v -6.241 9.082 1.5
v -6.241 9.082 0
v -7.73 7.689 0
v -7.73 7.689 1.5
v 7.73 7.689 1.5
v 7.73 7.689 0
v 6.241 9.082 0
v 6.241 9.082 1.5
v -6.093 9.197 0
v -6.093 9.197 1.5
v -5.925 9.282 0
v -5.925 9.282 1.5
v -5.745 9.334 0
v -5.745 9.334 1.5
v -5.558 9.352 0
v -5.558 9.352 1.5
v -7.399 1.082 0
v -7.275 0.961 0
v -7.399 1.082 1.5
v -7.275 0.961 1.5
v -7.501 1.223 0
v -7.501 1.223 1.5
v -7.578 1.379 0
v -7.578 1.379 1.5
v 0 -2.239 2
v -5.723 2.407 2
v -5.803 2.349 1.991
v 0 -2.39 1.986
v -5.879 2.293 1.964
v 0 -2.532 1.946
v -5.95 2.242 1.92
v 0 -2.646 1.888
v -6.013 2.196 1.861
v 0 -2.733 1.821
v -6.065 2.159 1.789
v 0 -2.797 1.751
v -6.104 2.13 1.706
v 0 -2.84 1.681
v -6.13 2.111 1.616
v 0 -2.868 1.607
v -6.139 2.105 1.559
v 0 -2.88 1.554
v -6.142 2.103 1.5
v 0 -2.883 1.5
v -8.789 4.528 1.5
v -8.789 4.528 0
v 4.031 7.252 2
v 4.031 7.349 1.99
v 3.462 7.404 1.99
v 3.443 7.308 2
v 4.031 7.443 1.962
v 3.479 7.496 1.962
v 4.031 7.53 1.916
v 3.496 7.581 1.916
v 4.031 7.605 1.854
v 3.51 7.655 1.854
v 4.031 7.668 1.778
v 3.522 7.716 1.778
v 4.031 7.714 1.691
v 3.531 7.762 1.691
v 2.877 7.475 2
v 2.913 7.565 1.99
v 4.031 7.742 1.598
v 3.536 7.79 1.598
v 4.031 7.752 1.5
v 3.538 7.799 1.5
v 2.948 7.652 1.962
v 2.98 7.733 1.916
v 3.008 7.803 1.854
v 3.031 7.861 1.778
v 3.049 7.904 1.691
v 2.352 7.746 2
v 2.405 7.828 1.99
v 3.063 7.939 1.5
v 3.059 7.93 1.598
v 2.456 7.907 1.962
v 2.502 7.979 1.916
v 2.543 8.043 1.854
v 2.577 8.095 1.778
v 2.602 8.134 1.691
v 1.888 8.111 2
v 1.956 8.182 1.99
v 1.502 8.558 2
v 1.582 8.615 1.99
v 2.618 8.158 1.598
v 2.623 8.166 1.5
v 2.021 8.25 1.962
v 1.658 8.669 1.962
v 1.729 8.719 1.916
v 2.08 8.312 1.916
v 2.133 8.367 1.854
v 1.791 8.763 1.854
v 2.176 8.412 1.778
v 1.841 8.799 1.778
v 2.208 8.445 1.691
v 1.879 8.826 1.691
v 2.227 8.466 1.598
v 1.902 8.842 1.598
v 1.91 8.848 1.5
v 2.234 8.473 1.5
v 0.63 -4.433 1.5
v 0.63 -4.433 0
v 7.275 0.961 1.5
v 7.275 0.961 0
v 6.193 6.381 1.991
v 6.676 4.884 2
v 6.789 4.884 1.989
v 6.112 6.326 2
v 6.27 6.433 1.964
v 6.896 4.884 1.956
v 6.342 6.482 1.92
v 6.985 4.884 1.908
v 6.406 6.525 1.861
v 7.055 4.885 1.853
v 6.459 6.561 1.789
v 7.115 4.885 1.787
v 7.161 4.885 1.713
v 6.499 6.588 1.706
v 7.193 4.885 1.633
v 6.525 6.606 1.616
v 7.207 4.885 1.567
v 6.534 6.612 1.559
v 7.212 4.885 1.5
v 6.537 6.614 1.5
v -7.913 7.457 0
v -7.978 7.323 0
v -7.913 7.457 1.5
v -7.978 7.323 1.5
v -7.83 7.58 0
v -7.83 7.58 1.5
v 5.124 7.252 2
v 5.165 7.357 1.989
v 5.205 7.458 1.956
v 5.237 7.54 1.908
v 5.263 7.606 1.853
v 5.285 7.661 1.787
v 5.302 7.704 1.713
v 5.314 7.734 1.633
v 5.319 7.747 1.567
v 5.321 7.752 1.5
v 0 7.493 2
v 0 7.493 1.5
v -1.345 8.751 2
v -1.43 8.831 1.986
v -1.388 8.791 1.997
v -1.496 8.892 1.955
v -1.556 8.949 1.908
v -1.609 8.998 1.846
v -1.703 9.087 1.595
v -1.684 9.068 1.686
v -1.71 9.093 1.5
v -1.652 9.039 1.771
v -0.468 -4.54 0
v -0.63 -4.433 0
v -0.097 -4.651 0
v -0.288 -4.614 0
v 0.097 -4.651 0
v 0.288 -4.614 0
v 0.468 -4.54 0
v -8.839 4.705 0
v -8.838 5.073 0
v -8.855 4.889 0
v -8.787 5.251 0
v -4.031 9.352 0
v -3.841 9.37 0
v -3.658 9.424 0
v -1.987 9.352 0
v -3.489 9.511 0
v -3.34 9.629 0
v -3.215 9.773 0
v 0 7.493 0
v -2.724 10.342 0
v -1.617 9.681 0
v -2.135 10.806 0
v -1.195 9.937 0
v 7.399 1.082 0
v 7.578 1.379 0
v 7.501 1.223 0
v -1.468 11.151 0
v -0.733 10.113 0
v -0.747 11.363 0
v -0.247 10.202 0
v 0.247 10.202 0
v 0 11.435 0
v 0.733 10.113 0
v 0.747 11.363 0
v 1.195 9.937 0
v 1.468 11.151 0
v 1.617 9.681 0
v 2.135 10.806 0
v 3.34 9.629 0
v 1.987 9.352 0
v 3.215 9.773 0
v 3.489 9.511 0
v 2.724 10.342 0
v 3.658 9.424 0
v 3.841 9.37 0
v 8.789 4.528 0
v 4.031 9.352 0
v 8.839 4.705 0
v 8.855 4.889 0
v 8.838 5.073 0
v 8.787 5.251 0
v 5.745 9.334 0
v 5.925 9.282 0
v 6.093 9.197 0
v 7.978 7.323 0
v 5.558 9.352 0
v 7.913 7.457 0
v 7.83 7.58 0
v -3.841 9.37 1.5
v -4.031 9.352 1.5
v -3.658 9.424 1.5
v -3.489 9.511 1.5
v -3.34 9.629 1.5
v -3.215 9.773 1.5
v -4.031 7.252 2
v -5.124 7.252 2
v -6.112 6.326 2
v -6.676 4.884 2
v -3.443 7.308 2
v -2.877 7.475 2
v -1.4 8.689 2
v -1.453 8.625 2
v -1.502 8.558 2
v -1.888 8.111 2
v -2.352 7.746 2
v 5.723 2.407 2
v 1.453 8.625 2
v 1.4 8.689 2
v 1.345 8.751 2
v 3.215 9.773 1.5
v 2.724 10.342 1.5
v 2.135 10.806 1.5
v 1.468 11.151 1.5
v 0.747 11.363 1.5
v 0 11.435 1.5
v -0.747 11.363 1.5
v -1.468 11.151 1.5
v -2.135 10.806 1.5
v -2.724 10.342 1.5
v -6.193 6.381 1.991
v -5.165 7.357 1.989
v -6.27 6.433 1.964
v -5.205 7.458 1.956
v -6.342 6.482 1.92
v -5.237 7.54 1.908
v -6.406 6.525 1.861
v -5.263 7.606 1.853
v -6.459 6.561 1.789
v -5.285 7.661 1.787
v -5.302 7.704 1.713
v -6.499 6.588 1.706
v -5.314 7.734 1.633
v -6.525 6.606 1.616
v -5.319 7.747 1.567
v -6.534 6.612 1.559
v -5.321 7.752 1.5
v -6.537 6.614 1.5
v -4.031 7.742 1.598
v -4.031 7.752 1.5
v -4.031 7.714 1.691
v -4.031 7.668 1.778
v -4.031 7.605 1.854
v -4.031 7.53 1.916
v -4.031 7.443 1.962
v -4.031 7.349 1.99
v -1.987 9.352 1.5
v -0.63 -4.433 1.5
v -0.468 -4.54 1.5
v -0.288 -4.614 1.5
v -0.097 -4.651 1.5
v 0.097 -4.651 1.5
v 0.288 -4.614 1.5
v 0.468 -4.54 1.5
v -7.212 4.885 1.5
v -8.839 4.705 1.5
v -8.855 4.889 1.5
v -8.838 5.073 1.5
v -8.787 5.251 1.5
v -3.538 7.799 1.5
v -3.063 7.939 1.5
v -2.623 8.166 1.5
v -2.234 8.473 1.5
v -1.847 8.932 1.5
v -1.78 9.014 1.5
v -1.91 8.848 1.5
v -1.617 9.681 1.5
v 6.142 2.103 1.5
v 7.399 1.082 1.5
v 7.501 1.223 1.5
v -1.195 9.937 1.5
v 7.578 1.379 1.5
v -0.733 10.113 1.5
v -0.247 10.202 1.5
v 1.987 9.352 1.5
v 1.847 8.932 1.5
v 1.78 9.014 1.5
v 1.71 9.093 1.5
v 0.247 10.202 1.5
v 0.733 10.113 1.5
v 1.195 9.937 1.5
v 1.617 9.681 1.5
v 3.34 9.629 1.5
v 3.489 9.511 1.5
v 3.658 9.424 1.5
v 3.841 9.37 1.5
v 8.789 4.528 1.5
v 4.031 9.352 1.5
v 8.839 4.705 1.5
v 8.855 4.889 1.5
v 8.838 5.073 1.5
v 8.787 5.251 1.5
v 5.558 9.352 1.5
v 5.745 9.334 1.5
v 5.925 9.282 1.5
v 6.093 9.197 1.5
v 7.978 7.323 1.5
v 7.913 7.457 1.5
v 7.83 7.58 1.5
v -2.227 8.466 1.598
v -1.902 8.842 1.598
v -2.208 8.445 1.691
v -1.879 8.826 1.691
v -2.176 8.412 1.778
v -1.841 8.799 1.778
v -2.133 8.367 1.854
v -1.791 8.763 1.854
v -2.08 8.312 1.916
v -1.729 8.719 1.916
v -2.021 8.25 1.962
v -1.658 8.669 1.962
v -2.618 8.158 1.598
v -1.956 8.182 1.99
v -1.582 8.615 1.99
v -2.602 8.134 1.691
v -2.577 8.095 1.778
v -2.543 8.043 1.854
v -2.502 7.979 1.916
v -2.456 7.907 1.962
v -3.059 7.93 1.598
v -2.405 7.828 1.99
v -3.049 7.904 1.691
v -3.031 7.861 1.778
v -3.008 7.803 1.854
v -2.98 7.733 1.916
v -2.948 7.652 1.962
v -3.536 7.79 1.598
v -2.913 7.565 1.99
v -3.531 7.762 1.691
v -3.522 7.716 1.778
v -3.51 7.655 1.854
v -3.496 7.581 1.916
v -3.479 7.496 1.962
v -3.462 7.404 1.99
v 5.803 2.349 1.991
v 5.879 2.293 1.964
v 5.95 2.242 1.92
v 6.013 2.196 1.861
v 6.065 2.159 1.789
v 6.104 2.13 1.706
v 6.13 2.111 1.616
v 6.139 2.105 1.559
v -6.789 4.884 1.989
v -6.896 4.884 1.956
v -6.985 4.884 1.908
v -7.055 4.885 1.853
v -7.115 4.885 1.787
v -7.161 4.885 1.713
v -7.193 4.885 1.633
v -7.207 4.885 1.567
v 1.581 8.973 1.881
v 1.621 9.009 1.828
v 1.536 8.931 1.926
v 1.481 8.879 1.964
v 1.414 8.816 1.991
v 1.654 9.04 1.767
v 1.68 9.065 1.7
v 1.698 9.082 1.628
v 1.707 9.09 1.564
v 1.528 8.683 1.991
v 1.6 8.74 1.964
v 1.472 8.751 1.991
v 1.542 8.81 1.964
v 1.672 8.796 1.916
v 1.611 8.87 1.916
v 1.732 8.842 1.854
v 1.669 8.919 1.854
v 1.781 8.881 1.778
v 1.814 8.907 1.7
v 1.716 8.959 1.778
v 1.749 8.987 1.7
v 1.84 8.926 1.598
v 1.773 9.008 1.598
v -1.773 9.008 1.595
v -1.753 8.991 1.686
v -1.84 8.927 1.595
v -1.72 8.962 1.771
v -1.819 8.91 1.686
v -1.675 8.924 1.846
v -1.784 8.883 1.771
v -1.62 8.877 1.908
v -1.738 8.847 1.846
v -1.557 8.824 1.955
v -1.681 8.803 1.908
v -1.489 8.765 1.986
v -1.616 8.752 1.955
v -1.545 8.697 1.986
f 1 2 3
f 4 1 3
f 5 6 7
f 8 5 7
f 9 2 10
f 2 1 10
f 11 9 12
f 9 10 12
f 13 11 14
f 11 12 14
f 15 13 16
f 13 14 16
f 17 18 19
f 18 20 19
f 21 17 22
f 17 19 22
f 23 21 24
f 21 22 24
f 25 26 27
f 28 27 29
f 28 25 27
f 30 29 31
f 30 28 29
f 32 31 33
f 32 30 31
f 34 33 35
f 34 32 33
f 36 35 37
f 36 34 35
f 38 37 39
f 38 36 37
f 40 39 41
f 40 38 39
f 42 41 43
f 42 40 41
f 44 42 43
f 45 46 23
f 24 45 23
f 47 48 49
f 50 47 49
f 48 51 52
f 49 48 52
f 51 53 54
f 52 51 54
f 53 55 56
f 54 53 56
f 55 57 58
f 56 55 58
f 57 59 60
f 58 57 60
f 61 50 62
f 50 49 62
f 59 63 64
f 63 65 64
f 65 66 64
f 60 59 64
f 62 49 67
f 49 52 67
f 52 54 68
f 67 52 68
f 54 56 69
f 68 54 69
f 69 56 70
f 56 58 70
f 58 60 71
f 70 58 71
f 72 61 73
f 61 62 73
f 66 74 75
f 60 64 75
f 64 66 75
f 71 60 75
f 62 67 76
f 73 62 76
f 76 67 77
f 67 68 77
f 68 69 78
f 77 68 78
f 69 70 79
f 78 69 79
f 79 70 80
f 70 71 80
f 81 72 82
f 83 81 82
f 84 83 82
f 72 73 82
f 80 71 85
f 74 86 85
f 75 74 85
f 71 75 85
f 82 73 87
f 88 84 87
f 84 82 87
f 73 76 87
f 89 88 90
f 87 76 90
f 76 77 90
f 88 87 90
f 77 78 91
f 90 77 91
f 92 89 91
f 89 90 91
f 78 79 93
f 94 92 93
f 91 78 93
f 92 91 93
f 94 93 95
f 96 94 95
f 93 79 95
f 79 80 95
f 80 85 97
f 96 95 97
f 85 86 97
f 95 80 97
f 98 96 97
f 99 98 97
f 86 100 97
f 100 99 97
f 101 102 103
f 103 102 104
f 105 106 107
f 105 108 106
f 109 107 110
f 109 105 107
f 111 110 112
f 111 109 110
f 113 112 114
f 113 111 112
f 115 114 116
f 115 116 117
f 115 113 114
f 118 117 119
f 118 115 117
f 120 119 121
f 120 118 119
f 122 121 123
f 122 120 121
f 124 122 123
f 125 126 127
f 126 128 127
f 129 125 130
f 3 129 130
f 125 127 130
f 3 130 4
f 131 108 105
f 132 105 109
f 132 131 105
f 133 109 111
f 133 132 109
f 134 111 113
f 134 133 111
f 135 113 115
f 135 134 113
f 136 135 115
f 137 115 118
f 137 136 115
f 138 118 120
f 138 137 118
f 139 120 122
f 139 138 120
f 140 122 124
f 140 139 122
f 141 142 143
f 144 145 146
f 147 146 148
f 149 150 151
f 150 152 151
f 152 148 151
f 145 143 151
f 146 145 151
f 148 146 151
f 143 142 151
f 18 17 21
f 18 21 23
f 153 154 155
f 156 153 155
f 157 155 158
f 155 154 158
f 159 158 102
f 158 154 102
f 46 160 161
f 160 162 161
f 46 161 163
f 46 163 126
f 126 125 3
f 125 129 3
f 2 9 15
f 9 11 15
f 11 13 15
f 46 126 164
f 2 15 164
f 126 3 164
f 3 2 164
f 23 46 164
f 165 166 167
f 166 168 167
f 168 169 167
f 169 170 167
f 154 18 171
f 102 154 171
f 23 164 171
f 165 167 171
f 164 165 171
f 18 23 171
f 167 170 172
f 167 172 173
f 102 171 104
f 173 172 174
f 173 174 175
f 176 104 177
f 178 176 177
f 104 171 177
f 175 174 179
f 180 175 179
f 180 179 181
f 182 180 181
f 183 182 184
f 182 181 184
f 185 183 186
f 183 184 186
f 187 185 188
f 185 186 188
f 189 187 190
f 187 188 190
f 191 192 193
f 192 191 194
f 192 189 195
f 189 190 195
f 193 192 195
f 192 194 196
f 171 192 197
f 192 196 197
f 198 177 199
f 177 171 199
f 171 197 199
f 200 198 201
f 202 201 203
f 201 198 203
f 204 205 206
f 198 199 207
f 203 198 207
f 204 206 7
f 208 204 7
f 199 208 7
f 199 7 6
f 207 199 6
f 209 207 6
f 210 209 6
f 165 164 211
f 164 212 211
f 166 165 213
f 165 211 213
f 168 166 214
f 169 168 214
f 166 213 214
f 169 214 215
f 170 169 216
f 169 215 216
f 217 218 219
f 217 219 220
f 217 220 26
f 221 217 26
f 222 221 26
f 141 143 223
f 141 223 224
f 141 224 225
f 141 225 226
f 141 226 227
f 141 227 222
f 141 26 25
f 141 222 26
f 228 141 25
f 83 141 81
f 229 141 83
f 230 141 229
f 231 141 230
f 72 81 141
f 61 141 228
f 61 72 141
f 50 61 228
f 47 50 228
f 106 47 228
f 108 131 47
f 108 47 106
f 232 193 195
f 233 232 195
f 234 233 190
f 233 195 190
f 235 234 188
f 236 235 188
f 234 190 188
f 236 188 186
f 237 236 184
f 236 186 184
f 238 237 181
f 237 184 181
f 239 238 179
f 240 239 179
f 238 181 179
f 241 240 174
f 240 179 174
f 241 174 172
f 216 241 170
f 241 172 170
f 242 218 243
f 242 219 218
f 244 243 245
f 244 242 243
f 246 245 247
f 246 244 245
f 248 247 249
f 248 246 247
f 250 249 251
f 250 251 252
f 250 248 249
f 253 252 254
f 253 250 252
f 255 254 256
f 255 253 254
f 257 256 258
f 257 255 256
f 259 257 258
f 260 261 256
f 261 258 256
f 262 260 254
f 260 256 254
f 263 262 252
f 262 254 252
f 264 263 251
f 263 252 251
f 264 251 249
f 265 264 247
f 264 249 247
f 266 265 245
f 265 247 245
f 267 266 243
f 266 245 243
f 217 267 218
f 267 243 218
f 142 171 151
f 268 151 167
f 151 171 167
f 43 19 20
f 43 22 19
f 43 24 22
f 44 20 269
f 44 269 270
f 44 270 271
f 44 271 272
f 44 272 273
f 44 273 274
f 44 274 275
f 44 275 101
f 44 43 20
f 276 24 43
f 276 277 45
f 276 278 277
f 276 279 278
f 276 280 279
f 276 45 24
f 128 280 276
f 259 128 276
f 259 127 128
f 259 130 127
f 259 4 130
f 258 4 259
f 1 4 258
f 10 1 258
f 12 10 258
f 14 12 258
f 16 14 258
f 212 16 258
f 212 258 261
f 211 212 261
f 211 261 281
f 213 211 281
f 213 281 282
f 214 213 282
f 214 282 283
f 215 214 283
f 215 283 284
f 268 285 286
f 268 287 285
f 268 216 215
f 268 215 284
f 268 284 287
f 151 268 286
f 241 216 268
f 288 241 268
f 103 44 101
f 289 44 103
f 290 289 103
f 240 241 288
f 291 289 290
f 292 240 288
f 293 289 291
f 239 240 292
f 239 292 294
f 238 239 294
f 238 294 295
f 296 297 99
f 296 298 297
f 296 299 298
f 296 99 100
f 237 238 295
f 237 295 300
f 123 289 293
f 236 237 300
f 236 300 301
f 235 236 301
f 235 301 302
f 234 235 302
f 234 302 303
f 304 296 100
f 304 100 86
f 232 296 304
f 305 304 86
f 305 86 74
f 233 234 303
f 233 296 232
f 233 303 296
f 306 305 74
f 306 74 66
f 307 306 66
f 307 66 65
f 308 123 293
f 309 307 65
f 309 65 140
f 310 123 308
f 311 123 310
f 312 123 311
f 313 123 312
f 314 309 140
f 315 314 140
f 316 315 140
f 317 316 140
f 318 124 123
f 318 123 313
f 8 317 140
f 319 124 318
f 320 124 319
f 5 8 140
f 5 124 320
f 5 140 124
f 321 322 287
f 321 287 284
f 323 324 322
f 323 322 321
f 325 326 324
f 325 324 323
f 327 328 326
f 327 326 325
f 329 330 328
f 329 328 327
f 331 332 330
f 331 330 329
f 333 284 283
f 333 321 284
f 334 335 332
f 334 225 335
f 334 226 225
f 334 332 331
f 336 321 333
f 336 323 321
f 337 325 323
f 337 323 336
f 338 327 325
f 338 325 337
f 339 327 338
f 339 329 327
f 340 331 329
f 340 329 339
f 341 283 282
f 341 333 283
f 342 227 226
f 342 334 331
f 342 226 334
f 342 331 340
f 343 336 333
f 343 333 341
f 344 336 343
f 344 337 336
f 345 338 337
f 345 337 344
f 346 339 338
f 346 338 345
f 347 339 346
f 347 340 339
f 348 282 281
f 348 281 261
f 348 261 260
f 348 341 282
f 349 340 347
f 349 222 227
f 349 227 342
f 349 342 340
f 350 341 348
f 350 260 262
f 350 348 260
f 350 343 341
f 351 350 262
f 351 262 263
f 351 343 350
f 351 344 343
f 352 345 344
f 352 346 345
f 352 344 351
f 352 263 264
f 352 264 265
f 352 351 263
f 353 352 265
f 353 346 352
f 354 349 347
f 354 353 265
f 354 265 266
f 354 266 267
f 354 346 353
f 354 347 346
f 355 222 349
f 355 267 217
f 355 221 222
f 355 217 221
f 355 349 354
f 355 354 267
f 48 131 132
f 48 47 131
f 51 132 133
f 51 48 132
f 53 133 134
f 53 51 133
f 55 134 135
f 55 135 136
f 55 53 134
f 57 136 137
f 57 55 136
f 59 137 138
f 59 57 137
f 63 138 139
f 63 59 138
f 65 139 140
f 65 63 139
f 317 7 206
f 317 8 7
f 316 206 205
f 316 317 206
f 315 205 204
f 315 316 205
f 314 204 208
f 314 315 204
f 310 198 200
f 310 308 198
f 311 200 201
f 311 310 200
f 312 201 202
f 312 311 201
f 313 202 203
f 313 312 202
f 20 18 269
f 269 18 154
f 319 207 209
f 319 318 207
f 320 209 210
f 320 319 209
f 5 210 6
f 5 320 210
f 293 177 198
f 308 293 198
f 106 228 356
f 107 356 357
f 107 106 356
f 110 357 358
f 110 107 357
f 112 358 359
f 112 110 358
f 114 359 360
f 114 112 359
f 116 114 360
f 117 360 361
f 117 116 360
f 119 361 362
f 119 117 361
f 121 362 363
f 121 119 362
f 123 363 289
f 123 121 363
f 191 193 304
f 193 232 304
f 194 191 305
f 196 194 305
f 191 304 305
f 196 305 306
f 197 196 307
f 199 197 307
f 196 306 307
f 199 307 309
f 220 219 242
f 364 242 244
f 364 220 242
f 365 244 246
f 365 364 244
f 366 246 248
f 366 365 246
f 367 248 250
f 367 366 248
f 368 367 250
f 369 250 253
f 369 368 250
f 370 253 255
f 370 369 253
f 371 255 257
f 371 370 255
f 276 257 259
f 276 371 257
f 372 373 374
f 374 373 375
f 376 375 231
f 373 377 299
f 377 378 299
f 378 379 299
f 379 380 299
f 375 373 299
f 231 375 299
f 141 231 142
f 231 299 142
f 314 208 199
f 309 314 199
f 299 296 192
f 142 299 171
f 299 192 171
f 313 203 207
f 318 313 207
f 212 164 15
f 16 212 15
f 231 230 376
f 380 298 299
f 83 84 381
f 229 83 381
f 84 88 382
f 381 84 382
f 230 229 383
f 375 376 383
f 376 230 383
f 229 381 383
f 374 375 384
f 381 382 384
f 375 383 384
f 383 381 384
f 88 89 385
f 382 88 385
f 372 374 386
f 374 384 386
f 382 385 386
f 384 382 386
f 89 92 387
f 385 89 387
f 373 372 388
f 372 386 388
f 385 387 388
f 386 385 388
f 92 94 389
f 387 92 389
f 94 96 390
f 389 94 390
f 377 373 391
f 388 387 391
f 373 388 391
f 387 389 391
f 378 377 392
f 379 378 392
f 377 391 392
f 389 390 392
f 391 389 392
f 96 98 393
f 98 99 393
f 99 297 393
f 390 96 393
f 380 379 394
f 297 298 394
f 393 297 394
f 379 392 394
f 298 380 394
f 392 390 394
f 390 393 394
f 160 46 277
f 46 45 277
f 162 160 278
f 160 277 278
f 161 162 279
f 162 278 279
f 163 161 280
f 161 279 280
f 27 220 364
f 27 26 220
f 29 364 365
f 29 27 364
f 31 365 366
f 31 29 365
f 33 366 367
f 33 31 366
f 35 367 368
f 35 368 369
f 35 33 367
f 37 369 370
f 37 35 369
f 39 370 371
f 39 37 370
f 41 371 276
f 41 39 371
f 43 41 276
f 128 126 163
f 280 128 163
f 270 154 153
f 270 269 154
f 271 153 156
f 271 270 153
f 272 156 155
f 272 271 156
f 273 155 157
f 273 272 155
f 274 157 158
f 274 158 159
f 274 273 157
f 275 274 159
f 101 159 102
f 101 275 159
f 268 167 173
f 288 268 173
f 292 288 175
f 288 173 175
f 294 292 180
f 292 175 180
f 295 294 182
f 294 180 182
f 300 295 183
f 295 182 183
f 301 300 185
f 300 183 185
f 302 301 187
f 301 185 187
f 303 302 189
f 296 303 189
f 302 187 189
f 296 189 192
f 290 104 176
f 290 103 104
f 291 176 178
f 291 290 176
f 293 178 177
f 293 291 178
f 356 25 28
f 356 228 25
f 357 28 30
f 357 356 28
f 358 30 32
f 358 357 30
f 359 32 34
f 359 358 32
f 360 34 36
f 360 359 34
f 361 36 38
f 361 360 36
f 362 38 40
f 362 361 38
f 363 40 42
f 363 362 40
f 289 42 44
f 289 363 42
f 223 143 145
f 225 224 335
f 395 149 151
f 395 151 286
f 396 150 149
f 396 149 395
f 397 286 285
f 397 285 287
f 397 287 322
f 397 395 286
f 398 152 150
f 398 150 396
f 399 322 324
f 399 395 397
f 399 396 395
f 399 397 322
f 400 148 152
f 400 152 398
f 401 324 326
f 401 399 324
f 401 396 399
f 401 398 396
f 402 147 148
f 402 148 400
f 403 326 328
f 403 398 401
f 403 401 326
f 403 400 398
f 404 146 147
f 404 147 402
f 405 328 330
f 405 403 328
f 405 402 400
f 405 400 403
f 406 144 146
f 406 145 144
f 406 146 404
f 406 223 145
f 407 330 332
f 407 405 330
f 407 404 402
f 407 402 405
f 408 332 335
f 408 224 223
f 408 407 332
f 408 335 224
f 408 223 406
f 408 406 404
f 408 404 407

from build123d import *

# Parameters (mm, degrees)
F1_DEPTH = 1.5
F2_R     = 1
F3_R     = 1
F5_DEPTH = 0.5
F6_R     = 0.49999


# Not quite as in the source:
# - a fillet or chamfer is up to 0.001 mm smaller than in the source, because OpenCascade refuses the exact size


with BuildPart() as f1:
    # F0 (on Top) → F1 (new body)
    with BuildSketch(Plane.XY):
        with BuildLine():
            ThreePointArc((-1.986540854, 9.3519296497), (0, 10.2135319331), (1.986540854, 9.3519296497))
            Line((1.986540854, 9.3519296497), (3.4759494504, 9.3519296497))
            ThreePointArc((3.4759494504, 9.3519296497), (0, 11.4346017651), (-3.4759494504, 9.3519296497))
            Line((-3.4759494504, 9.3519296497), (-1.986540854, 9.3519296497))
        make_face()
        with BuildLine():
            Line((5.9530865401, 9.3519296497), (3.4759494504, 9.3519296497))
            ThreePointArc((3.4759494504, 9.3519296497), (3.8237056455, 8.4510290854), (3.9419905804, 7.4926111847))
            ThreePointArc((3.9419905804, 7.4926111847), (-0.9584179006, 3.6689055392), (-3.4759494504, 9.3519296497))
            Line((-3.4759494504, 9.3519296497), (-5.9530865401, 9.3519296497))
            Line((-5.9530865401, 9.3519296497), (-7.8950412571, 7.5339297764))
            Line((-7.8950412571, 7.5339297764), (-8.927995339, 4.88956552))
            Line((-8.927995339, 4.88956552), (-7.4818595313, 1.1296109296))
            Line((-7.4818595313, 1.1296109296), (0, -4.9441619776))
            Line((0, -4.9441619776), (7.4818595313, 1.1296109296))
            Line((7.4818595313, 1.1296109296), (8.927995339, 4.88956552))
            Line((8.927995339, 4.88956552), (7.8950412571, 7.5339297764))
            Line((7.8950412571, 7.5339297764), (5.9530865401, 9.3519296497))
        make_face()
        with BuildLine():
            Line((3.4759494504, 9.3519296497), (1.986540854, 9.3519296497))
            ThreePointArc((1.986540854, 9.3519296497), (2.5306748058, 8.4921584552), (2.7209207483, 7.4926111847))
            ThreePointArc((2.7209207483, 7.4926111847), (-0.9995472705, 4.9619363789), (-1.986540854, 9.3519296497))
            Line((-1.986540854, 9.3519296497), (-3.4759494504, 9.3519296497))
            ThreePointArc((-3.4759494504, 9.3519296497), (-0.9584179006, 3.6689055392), (3.9419905804, 7.4926111847))
            ThreePointArc((3.9419905804, 7.4926111847), (3.8237056455, 8.4510290854), (3.4759494504, 9.3519296497))
        make_face()
        with BuildLine():
            Line((1.986540854, 9.3519296497), (0, 7.4926111847))
            Line((0, 7.4926111847), (-1.986540854, 9.3519296497))
            ThreePointArc((-1.986540854, 9.3519296497), (-0.9995472705, 4.9619363789), (2.7209207483, 7.4926111847))
            ThreePointArc((2.7209207483, 7.4926111847), (2.5306748058, 8.4921584552), (1.986540854, 9.3519296497))
        make_face()
    extrude(amount=F1_DEPTH)

    # F2
    f2_edges = [f1.edges().sort_by_distance(p)[0] for p in [
        (0, -4.944162, 0.75),
    ]]
    fillet(f2_edges, radius=F2_R)

    # F3
    f3_edges = [f1.edges().sort_by_distance(p)[0] for p in [
        (7.48186, 1.129611, 0.75),
        (8.927995, 4.889566, 0.75),
        (7.895041, 7.53393, 0.75),
        (5.953087, 9.35193, 0.75),
        (-7.48186, 1.129611, 0.75),
        (-8.927995, 4.889566, 0.75),
        (-7.895041, 7.53393, 0.75),
        (-5.953087, 9.35193, 0.75),
        (-3.475949, 9.35193, 0.75),
        (3.475949, 9.35193, 0.75),
    ]]
    fillet(f3_edges, radius=F3_R)

    # F4 (on face) → F5 (join)
    with BuildSketch(Plane.XY.offset(1.5)):
        with BuildLine():
            ThreePointArc((-1.7098843542, 9.0929908328), (-1.8141917234, 8.9737012946), (-1.9101937031, 8.8476313097))
            ThreePointArc((-1.9101937031, 8.8476313097), (-2.837339859, 8.0420404539), (-4.0308273111, 7.7519295737))
            Line((-4.0308273111, 7.7519295737), (-5.3210256953, 7.7519295737))
            Line((-5.3210256953, 7.7519295737), (-6.5367130105, 6.613839501))
            Line((-6.5367130105, 6.613839501), (-7.2120080925, 4.88508291))
            Line((-7.2120080925, 4.88508291), (-6.141831705, 2.1026231998))
            Line((-6.141831705, 2.1026231998), (0, -2.8833152363))
            Line((0, -2.8833152363), (6.141831705, 2.1026231998))
            Line((6.141831705, 2.1026231998), (7.2120080925, 4.88508291))
            Line((7.2120080925, 4.88508291), (6.5367130105, 6.613839501))
            Line((6.5367130105, 6.613839501), (5.3210256953, 7.7519295737))
            Line((5.3210256953, 7.7519295737), (4.0308273111, 7.7519295737))
            ThreePointArc((4.0308273111, 7.7519295737), (2.837339859, 8.0420404539), (1.9101937031, 8.8476313097))
            ThreePointArc((1.9101937031, 8.8476313097), (1.8141917234, 8.9737012946), (1.7098843542, 9.0929908328))
            Line((1.7098843542, 9.0929908328), (0, 7.4926111847))
            Line((0, 7.4926111847), (-1.7098843542, 9.0929908328))
        make_face()
    extrude(amount=F5_DEPTH)

    # F6 (radius 0.5 in the source; OpenCascade refuses exactly that, so slightly less here)
    f6_edges = [f1.edges().sort_by_distance(p)[0] for p in [
        (-5.928869, 7.182885, 2),
        (-6.874361, 5.749461, 2),
        (-6.67692, 3.493853, 2),
        (-3.070916, -0.390346, 2),
        (3.070916, -0.390346, 2),
        (6.67692, 3.493853, 2),
        (6.874361, 5.749461, 2),
        (5.928869, 7.182885, 2),
        (4.675927, 7.75193, 2),
        (2.83734, 8.04204, 2),
        (-2.83734, 8.04204, 2),
    ]]
    fillet(f6_edges, radius=F6_R)


solid = f1.part
